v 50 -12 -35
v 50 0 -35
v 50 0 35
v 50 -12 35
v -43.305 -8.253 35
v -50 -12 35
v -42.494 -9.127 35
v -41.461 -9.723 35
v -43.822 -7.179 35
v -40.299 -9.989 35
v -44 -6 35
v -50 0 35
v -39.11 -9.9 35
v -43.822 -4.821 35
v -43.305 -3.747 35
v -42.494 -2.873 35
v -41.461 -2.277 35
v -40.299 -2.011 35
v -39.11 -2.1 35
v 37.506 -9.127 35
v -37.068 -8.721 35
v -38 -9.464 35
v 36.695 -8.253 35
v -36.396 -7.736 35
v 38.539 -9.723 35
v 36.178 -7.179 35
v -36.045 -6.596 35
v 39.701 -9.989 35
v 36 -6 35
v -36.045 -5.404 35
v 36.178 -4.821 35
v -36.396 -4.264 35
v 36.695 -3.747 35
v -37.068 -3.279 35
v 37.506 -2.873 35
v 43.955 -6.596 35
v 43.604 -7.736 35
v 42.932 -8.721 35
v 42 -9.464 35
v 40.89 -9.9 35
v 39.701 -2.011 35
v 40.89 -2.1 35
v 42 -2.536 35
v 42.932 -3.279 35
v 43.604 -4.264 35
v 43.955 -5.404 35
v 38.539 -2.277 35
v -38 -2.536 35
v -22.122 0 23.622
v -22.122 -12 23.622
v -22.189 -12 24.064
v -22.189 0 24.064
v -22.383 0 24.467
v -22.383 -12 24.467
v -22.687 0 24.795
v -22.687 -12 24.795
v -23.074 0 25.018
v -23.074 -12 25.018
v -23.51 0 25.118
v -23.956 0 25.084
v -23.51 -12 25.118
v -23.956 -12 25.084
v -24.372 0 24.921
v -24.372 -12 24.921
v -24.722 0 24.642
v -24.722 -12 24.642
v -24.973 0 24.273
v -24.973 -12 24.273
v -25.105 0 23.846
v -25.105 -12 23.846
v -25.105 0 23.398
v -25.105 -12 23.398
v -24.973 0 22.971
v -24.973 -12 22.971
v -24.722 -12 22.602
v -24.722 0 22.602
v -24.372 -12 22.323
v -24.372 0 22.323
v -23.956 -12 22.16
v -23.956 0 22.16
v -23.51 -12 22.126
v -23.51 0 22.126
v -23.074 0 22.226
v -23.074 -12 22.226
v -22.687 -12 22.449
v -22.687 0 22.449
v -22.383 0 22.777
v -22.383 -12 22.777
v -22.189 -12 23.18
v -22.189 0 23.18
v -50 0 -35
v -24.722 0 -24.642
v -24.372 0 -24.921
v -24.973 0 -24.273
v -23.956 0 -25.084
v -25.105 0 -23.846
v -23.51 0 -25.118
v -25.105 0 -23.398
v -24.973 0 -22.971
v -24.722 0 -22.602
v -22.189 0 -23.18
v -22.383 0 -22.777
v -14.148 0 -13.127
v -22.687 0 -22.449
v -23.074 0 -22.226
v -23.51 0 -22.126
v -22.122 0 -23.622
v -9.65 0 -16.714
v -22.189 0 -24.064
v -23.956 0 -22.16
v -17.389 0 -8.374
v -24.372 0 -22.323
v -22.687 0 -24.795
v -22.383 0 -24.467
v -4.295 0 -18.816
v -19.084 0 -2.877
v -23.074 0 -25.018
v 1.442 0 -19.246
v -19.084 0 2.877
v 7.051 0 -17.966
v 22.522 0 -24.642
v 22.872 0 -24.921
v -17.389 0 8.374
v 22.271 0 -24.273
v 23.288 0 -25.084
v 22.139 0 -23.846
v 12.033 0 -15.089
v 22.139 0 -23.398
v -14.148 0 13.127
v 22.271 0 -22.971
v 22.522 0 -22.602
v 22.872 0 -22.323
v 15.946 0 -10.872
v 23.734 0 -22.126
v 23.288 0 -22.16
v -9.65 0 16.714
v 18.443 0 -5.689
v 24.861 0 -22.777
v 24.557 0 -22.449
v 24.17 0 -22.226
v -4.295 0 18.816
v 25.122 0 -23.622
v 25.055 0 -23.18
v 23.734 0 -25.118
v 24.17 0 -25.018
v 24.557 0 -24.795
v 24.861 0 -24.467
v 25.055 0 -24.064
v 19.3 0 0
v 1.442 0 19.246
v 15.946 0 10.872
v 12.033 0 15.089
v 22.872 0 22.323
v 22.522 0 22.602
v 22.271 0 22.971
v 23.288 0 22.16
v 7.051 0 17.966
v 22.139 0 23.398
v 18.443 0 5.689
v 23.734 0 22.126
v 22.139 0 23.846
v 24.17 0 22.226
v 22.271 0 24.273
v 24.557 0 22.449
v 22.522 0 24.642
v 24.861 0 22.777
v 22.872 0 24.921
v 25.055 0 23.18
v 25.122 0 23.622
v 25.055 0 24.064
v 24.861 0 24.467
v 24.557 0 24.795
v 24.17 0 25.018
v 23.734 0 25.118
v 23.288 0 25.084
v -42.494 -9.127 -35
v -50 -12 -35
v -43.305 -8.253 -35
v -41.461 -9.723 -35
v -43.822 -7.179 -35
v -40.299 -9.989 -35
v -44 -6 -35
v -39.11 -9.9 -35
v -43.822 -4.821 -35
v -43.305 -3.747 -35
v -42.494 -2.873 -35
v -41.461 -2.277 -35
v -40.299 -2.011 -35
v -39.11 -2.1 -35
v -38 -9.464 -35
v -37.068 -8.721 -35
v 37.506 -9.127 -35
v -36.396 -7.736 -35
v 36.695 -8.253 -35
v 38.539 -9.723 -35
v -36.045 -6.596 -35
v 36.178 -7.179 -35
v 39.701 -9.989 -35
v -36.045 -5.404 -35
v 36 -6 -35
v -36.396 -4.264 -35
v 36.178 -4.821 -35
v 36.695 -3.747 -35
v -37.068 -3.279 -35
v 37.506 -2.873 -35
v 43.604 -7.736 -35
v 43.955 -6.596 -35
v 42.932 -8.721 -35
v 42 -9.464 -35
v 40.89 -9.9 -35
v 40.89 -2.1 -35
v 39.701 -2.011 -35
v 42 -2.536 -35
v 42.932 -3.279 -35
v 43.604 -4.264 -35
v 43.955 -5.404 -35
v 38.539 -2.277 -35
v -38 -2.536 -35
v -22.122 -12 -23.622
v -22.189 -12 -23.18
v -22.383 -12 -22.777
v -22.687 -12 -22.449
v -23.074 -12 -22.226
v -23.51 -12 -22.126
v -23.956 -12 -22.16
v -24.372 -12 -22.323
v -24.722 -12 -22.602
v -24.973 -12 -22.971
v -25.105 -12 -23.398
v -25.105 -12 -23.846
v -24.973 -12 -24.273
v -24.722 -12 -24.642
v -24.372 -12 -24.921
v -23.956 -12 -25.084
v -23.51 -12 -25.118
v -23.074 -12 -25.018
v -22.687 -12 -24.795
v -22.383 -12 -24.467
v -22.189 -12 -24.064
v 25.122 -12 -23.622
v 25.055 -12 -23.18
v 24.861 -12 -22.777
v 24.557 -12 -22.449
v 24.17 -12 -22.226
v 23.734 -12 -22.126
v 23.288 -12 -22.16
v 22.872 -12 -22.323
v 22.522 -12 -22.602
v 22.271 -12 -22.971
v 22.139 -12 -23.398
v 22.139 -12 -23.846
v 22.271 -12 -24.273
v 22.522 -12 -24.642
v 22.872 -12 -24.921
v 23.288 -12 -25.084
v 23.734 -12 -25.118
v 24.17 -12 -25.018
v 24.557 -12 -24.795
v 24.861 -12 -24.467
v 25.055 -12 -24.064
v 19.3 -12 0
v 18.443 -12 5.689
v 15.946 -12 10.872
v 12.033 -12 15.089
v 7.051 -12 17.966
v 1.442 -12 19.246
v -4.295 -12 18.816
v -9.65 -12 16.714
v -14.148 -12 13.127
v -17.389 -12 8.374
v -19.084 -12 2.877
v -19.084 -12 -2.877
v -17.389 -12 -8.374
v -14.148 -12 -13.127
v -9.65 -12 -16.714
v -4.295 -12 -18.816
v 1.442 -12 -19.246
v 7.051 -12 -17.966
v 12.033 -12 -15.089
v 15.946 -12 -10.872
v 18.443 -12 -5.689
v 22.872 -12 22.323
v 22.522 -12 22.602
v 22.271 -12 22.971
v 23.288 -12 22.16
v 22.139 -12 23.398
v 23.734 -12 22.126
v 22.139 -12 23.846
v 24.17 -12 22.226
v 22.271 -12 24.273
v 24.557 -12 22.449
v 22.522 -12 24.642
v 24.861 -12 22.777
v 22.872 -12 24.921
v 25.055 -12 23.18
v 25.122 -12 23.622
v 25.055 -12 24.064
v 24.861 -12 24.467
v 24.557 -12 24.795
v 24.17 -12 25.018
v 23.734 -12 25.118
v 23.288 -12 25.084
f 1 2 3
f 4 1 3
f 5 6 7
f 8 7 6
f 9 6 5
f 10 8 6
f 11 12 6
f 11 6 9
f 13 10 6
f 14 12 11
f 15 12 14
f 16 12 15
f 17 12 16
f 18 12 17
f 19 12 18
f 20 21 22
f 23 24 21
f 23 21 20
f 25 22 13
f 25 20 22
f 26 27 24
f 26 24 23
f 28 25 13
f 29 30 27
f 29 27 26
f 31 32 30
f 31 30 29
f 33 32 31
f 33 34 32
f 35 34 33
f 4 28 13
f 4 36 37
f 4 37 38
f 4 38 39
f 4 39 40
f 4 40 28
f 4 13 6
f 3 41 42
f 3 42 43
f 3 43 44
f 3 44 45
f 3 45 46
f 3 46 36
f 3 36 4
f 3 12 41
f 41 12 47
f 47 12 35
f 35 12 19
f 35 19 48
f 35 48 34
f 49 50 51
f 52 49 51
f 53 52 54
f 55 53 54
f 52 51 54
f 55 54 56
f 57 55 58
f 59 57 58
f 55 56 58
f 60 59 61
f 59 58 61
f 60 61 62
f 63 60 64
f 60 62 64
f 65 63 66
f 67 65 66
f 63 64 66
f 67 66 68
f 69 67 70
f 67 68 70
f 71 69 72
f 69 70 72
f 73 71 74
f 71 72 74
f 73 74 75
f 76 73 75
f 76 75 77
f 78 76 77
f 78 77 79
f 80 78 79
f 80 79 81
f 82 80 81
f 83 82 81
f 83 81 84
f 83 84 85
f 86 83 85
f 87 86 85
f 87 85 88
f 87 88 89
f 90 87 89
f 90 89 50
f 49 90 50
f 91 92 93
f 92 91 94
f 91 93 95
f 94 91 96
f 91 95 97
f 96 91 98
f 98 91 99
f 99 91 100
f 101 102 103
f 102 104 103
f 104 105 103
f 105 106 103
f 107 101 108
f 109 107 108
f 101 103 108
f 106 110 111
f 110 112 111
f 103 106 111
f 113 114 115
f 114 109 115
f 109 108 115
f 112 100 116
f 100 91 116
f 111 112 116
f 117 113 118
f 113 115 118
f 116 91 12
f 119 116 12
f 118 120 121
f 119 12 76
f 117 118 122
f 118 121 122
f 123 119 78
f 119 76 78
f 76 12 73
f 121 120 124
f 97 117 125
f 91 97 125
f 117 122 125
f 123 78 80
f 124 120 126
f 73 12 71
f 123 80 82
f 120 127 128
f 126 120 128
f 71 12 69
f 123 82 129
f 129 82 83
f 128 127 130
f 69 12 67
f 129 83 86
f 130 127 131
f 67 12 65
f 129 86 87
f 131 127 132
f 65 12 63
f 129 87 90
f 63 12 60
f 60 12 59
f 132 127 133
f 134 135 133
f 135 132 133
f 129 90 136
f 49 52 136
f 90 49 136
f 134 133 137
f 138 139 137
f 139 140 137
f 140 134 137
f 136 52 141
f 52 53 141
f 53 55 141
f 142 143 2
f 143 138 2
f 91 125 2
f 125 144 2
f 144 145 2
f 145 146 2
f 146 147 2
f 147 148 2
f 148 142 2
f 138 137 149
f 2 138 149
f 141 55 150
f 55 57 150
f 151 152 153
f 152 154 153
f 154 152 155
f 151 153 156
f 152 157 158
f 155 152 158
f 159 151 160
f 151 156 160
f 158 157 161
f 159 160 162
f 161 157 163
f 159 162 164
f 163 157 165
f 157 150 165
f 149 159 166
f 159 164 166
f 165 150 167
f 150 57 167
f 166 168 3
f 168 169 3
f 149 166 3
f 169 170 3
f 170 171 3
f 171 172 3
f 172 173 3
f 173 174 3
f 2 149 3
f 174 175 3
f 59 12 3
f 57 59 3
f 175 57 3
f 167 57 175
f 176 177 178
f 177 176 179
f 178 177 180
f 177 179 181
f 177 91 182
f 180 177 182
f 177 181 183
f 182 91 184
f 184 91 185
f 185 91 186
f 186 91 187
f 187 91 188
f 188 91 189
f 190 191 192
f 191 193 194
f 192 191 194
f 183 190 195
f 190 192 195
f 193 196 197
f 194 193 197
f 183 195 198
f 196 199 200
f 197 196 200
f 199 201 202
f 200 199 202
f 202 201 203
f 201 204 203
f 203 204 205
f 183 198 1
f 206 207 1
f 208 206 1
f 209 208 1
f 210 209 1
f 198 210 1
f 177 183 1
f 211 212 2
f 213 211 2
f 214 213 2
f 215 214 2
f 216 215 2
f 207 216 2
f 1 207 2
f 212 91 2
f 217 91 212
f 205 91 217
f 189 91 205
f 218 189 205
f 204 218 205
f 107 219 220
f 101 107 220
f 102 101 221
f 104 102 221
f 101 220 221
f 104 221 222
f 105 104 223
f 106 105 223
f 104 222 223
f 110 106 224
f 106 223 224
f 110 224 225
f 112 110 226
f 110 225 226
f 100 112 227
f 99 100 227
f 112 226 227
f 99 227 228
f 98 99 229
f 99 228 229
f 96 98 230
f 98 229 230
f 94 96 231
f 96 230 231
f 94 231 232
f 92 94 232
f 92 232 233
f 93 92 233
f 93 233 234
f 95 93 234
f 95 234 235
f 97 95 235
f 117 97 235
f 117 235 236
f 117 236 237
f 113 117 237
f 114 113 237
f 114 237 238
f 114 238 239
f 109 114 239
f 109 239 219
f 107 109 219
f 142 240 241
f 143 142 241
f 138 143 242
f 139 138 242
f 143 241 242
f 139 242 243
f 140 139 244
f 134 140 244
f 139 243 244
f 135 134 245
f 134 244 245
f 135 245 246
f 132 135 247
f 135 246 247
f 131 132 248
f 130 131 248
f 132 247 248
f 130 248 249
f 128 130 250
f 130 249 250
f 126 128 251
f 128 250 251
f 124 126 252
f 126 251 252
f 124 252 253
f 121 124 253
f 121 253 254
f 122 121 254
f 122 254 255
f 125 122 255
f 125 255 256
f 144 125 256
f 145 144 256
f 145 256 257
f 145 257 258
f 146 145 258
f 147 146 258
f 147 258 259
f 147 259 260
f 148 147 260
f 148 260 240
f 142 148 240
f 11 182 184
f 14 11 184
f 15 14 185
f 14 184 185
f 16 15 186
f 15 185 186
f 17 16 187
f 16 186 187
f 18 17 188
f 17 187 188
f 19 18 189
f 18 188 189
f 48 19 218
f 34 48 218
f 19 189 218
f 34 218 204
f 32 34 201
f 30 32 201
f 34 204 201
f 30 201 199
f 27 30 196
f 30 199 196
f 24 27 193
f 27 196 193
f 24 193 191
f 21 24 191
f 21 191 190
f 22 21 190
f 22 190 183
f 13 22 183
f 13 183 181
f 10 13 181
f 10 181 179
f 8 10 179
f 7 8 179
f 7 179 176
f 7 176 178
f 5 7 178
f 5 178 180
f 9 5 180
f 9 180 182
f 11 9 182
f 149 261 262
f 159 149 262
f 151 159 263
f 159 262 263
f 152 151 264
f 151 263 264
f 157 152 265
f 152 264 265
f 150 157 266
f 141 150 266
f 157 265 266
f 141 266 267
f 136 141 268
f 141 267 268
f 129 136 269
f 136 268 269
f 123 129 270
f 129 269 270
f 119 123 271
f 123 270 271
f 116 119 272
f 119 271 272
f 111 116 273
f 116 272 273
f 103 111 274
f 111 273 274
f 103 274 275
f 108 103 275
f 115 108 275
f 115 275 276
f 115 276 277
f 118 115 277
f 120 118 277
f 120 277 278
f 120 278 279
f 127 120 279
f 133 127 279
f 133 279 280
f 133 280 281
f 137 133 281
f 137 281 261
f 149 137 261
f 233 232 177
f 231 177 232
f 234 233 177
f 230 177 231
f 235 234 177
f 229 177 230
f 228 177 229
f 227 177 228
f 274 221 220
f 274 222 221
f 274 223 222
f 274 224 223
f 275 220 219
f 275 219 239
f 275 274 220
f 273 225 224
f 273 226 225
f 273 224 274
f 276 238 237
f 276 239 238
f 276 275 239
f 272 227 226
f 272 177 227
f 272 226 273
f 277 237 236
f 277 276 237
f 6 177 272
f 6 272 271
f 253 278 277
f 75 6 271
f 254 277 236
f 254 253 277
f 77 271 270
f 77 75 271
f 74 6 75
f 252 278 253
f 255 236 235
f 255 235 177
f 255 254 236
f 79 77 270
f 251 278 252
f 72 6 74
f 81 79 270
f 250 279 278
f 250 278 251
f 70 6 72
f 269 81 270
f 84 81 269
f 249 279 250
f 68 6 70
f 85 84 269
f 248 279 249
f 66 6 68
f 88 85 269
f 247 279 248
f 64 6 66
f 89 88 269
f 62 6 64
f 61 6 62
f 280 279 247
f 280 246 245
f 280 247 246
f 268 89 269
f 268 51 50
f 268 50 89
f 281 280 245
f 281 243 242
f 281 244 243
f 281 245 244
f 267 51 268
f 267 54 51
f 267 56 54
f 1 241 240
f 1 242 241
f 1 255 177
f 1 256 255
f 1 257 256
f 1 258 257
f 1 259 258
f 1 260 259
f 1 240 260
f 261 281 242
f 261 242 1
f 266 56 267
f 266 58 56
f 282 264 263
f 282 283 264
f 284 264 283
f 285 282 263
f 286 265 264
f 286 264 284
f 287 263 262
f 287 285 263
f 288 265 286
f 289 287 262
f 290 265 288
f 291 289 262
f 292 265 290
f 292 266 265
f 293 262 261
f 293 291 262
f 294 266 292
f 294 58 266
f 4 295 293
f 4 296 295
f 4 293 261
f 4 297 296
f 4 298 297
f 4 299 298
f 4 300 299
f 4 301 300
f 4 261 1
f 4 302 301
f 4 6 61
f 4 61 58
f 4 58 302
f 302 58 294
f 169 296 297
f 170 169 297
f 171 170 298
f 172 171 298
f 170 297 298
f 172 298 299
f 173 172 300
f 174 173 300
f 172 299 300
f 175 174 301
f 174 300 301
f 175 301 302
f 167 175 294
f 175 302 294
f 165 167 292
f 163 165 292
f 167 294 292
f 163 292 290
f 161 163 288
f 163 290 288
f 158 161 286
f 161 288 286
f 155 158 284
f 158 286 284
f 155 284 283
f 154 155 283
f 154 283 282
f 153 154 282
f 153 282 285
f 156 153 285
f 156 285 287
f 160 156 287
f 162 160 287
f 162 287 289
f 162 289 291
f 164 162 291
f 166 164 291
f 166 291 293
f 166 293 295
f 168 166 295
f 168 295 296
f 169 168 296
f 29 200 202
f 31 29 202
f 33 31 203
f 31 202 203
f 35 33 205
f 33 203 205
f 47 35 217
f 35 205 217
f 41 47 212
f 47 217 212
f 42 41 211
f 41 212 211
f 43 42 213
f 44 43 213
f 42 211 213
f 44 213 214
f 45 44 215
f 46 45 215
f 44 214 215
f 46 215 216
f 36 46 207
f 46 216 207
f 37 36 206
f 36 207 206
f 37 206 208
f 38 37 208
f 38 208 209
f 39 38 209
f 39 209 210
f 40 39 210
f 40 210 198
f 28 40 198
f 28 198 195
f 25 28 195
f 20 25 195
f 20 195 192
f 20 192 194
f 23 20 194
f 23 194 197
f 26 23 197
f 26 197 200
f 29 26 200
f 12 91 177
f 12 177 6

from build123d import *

# Parameters (mm, degrees)
F0_W     = 100
F0_H     = 70
F1_DEPTH = 12
F2_R     = 19.3
F2_R_2   = 1.5
F3_DEPTH = 12.001
F5_D     = 8


with BuildPart() as f1:
    # F0 (on Front) → F1 (new body)
    with BuildSketch(Plane.XZ):
        Rectangle(F0_W, F0_H)
    extrude(amount=F1_DEPTH)

    # F2 (on face) → F3 (cut, through all)
    with BuildSketch(Plane.XZ.offset(12)):
        Circle(F2_R)
        with Locations((-23.622, 23.622)):
            Circle(F2_R_2)
        with Locations((23.622, 23.622)):
            Circle(F2_R_2)
        with Locations((23.622, -23.622)):
            Circle(F2_R_2)
        with Locations((-23.622, -23.622)):
            Circle(F2_R_2)
    extrude(amount=-F3_DEPTH, mode=Mode.SUBTRACT)

    # F5 (through all)
    with Locations(Plane.XY.offset(35)):
        with Locations((-40, -6), (40, -6)):
            Hole(F5_D / 2)


solid = f1.part
